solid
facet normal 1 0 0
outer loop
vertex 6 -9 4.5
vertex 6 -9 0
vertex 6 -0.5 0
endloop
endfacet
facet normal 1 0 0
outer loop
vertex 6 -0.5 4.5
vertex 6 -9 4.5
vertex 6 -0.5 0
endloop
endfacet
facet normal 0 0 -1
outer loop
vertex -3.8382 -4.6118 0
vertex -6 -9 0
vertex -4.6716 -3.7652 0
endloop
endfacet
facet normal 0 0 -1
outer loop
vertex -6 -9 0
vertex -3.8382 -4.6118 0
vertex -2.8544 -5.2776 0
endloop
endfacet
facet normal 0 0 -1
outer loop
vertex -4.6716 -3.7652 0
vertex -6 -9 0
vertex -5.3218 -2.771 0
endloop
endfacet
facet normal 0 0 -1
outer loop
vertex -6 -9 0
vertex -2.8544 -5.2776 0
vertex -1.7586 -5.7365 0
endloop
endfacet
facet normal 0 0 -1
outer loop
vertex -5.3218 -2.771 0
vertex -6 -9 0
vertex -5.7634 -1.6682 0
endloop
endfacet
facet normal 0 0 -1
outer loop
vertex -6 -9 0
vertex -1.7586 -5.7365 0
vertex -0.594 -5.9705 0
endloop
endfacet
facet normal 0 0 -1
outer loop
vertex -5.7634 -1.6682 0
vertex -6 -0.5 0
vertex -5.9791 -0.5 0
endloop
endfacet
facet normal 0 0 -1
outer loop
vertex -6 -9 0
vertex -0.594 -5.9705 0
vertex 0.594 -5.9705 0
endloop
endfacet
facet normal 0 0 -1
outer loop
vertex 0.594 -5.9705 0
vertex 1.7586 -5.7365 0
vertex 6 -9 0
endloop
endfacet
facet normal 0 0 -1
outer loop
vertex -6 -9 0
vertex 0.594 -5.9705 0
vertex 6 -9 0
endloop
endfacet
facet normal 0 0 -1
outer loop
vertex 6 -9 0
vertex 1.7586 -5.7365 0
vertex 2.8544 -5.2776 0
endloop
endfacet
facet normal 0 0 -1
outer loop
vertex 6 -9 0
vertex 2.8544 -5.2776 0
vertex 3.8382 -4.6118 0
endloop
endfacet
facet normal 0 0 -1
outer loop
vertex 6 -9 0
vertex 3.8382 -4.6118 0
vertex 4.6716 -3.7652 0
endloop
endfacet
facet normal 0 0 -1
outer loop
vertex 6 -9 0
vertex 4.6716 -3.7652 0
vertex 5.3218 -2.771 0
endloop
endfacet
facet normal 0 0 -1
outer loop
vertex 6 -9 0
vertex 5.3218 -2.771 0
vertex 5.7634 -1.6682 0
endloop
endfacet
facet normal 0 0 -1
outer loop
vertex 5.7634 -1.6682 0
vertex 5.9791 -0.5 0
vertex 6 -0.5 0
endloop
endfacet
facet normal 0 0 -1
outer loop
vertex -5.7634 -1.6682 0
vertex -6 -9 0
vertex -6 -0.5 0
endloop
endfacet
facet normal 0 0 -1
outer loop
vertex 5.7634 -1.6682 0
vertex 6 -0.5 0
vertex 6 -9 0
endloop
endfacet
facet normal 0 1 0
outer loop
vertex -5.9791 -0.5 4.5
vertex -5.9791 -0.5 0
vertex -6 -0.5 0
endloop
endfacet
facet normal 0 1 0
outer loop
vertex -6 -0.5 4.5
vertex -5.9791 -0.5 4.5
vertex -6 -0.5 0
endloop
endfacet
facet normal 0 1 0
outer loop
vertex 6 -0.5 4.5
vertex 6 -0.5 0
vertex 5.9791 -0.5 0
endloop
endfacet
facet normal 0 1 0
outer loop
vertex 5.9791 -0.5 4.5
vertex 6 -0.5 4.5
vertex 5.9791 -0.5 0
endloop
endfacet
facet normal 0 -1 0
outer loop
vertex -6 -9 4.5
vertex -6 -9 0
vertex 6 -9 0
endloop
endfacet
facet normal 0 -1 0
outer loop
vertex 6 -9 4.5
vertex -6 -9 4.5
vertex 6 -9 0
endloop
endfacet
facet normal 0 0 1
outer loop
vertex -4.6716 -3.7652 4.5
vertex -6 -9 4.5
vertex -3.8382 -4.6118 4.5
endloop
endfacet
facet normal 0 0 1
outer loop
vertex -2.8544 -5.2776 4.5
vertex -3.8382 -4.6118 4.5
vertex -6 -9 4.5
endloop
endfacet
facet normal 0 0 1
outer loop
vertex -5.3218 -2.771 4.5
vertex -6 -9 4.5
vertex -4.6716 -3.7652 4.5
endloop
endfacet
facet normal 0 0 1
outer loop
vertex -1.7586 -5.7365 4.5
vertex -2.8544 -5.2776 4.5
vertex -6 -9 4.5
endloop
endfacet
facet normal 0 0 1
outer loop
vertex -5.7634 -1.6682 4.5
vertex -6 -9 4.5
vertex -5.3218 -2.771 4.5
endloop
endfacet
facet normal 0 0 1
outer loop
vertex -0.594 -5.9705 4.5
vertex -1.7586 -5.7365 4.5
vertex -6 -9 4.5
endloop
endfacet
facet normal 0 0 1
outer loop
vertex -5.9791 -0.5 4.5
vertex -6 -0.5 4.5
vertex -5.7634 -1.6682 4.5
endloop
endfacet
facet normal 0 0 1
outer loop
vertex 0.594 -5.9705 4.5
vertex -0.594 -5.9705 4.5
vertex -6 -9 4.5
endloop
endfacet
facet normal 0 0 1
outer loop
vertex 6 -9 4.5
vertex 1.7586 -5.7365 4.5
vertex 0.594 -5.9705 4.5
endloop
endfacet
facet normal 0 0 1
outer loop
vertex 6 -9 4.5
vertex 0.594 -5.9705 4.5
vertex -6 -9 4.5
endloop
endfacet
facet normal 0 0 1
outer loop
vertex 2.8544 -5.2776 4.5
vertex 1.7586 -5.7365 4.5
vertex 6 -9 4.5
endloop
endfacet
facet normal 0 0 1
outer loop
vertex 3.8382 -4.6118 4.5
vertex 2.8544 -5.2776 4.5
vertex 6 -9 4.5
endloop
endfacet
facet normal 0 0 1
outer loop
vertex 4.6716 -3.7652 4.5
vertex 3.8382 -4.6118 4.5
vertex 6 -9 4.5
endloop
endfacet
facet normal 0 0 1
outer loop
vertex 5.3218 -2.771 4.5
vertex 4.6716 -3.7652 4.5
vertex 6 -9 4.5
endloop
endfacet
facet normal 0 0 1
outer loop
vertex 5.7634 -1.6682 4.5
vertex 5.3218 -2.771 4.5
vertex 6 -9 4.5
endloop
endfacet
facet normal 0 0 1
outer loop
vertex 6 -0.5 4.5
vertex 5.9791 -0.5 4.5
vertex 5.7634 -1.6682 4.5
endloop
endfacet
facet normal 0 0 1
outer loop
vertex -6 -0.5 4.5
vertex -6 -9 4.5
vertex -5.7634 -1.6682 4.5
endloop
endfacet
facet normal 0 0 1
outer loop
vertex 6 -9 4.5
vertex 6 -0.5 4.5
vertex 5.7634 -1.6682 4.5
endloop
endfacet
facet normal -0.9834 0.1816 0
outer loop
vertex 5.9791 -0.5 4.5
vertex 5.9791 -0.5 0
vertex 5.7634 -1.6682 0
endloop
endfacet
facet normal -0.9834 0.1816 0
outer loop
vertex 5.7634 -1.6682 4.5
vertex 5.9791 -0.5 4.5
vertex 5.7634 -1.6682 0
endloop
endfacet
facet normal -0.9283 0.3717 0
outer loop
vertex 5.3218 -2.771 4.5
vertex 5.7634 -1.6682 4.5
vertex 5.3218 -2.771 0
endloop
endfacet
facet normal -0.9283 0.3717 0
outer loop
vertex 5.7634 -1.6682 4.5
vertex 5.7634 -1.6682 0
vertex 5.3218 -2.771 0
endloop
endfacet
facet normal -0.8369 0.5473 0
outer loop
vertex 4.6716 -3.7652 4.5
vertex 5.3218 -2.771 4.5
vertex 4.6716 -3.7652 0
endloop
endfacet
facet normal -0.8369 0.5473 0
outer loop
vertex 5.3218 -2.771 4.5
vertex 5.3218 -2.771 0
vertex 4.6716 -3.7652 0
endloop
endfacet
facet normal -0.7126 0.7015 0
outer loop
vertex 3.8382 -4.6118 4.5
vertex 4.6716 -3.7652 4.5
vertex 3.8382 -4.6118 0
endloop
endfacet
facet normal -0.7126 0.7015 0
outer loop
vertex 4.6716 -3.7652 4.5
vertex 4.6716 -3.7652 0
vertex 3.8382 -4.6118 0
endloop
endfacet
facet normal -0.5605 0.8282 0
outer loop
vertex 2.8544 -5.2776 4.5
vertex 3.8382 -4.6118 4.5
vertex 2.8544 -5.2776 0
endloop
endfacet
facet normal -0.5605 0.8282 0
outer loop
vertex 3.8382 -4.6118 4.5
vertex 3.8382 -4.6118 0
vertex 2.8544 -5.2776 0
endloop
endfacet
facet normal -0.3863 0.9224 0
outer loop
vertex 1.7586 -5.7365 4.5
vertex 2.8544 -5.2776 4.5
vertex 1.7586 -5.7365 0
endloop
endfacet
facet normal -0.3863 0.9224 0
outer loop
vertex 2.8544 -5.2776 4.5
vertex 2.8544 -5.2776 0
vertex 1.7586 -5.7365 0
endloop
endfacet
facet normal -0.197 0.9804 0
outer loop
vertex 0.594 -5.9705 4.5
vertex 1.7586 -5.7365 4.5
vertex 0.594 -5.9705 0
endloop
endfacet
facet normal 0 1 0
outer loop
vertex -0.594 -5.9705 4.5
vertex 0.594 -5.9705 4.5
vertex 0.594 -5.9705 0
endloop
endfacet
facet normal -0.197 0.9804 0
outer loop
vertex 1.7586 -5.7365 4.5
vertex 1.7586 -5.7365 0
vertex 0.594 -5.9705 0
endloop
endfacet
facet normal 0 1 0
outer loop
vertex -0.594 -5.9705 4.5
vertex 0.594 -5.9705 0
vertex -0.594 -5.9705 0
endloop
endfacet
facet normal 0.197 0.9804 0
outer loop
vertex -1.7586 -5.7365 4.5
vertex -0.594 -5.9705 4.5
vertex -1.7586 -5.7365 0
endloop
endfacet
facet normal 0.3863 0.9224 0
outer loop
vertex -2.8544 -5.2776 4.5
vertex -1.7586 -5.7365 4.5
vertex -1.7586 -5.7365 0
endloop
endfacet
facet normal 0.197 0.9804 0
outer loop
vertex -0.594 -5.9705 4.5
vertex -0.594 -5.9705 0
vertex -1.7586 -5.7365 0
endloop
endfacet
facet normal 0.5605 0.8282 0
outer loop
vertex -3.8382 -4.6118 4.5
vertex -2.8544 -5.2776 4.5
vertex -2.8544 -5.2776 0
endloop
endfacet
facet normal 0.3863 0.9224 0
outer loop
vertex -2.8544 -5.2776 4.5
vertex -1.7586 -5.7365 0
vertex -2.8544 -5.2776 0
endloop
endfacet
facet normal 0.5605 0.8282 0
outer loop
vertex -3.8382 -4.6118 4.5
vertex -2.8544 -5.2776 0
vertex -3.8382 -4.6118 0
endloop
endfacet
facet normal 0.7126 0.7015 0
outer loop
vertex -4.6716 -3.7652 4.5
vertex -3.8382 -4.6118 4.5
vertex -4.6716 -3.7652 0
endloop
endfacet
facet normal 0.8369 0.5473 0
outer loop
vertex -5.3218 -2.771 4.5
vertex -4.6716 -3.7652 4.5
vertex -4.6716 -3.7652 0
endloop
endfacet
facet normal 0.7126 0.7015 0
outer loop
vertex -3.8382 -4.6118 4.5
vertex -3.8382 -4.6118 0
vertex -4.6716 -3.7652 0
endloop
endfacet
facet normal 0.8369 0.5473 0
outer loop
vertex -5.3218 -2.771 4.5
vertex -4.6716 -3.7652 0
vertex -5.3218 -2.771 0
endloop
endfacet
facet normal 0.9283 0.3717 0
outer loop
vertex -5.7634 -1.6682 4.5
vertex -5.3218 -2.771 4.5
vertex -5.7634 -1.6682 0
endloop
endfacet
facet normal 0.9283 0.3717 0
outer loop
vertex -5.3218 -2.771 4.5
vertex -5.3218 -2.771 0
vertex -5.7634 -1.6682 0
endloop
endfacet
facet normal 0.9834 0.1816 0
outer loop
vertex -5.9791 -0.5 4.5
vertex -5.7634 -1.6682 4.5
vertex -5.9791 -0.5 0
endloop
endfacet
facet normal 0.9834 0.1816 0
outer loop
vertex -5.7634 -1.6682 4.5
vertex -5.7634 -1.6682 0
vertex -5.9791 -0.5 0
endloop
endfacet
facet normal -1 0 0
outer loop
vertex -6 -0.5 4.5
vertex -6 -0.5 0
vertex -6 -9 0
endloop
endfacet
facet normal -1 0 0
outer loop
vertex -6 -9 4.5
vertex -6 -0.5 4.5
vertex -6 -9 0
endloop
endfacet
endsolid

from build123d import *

# Parameters (mm, degrees)
BOSS_EXTRUDE3_DEPTH = 4.5


with BuildPart() as part:
    # Sketch9<3> → Boss-Extrude3 (new body)
    with BuildSketch(Plane.XY):
        with BuildLine():
            Line((-5.979130372, -0.5), (-6, -0.5))
            Line((-6, -0.5), (-6, -9))
            Line((-6, -9), (6, -9))
            Line((6, -9), (6, -0.5))
            Line((6, -0.5), (5.979130372, -0.5))
            ThreePointArc((5.979130372, -0.5), (0, -6), (-5.979130372, -0.5))
        make_face()
    extrude(amount=BOSS_EXTRUDE3_DEPTH)


solid = part.part
